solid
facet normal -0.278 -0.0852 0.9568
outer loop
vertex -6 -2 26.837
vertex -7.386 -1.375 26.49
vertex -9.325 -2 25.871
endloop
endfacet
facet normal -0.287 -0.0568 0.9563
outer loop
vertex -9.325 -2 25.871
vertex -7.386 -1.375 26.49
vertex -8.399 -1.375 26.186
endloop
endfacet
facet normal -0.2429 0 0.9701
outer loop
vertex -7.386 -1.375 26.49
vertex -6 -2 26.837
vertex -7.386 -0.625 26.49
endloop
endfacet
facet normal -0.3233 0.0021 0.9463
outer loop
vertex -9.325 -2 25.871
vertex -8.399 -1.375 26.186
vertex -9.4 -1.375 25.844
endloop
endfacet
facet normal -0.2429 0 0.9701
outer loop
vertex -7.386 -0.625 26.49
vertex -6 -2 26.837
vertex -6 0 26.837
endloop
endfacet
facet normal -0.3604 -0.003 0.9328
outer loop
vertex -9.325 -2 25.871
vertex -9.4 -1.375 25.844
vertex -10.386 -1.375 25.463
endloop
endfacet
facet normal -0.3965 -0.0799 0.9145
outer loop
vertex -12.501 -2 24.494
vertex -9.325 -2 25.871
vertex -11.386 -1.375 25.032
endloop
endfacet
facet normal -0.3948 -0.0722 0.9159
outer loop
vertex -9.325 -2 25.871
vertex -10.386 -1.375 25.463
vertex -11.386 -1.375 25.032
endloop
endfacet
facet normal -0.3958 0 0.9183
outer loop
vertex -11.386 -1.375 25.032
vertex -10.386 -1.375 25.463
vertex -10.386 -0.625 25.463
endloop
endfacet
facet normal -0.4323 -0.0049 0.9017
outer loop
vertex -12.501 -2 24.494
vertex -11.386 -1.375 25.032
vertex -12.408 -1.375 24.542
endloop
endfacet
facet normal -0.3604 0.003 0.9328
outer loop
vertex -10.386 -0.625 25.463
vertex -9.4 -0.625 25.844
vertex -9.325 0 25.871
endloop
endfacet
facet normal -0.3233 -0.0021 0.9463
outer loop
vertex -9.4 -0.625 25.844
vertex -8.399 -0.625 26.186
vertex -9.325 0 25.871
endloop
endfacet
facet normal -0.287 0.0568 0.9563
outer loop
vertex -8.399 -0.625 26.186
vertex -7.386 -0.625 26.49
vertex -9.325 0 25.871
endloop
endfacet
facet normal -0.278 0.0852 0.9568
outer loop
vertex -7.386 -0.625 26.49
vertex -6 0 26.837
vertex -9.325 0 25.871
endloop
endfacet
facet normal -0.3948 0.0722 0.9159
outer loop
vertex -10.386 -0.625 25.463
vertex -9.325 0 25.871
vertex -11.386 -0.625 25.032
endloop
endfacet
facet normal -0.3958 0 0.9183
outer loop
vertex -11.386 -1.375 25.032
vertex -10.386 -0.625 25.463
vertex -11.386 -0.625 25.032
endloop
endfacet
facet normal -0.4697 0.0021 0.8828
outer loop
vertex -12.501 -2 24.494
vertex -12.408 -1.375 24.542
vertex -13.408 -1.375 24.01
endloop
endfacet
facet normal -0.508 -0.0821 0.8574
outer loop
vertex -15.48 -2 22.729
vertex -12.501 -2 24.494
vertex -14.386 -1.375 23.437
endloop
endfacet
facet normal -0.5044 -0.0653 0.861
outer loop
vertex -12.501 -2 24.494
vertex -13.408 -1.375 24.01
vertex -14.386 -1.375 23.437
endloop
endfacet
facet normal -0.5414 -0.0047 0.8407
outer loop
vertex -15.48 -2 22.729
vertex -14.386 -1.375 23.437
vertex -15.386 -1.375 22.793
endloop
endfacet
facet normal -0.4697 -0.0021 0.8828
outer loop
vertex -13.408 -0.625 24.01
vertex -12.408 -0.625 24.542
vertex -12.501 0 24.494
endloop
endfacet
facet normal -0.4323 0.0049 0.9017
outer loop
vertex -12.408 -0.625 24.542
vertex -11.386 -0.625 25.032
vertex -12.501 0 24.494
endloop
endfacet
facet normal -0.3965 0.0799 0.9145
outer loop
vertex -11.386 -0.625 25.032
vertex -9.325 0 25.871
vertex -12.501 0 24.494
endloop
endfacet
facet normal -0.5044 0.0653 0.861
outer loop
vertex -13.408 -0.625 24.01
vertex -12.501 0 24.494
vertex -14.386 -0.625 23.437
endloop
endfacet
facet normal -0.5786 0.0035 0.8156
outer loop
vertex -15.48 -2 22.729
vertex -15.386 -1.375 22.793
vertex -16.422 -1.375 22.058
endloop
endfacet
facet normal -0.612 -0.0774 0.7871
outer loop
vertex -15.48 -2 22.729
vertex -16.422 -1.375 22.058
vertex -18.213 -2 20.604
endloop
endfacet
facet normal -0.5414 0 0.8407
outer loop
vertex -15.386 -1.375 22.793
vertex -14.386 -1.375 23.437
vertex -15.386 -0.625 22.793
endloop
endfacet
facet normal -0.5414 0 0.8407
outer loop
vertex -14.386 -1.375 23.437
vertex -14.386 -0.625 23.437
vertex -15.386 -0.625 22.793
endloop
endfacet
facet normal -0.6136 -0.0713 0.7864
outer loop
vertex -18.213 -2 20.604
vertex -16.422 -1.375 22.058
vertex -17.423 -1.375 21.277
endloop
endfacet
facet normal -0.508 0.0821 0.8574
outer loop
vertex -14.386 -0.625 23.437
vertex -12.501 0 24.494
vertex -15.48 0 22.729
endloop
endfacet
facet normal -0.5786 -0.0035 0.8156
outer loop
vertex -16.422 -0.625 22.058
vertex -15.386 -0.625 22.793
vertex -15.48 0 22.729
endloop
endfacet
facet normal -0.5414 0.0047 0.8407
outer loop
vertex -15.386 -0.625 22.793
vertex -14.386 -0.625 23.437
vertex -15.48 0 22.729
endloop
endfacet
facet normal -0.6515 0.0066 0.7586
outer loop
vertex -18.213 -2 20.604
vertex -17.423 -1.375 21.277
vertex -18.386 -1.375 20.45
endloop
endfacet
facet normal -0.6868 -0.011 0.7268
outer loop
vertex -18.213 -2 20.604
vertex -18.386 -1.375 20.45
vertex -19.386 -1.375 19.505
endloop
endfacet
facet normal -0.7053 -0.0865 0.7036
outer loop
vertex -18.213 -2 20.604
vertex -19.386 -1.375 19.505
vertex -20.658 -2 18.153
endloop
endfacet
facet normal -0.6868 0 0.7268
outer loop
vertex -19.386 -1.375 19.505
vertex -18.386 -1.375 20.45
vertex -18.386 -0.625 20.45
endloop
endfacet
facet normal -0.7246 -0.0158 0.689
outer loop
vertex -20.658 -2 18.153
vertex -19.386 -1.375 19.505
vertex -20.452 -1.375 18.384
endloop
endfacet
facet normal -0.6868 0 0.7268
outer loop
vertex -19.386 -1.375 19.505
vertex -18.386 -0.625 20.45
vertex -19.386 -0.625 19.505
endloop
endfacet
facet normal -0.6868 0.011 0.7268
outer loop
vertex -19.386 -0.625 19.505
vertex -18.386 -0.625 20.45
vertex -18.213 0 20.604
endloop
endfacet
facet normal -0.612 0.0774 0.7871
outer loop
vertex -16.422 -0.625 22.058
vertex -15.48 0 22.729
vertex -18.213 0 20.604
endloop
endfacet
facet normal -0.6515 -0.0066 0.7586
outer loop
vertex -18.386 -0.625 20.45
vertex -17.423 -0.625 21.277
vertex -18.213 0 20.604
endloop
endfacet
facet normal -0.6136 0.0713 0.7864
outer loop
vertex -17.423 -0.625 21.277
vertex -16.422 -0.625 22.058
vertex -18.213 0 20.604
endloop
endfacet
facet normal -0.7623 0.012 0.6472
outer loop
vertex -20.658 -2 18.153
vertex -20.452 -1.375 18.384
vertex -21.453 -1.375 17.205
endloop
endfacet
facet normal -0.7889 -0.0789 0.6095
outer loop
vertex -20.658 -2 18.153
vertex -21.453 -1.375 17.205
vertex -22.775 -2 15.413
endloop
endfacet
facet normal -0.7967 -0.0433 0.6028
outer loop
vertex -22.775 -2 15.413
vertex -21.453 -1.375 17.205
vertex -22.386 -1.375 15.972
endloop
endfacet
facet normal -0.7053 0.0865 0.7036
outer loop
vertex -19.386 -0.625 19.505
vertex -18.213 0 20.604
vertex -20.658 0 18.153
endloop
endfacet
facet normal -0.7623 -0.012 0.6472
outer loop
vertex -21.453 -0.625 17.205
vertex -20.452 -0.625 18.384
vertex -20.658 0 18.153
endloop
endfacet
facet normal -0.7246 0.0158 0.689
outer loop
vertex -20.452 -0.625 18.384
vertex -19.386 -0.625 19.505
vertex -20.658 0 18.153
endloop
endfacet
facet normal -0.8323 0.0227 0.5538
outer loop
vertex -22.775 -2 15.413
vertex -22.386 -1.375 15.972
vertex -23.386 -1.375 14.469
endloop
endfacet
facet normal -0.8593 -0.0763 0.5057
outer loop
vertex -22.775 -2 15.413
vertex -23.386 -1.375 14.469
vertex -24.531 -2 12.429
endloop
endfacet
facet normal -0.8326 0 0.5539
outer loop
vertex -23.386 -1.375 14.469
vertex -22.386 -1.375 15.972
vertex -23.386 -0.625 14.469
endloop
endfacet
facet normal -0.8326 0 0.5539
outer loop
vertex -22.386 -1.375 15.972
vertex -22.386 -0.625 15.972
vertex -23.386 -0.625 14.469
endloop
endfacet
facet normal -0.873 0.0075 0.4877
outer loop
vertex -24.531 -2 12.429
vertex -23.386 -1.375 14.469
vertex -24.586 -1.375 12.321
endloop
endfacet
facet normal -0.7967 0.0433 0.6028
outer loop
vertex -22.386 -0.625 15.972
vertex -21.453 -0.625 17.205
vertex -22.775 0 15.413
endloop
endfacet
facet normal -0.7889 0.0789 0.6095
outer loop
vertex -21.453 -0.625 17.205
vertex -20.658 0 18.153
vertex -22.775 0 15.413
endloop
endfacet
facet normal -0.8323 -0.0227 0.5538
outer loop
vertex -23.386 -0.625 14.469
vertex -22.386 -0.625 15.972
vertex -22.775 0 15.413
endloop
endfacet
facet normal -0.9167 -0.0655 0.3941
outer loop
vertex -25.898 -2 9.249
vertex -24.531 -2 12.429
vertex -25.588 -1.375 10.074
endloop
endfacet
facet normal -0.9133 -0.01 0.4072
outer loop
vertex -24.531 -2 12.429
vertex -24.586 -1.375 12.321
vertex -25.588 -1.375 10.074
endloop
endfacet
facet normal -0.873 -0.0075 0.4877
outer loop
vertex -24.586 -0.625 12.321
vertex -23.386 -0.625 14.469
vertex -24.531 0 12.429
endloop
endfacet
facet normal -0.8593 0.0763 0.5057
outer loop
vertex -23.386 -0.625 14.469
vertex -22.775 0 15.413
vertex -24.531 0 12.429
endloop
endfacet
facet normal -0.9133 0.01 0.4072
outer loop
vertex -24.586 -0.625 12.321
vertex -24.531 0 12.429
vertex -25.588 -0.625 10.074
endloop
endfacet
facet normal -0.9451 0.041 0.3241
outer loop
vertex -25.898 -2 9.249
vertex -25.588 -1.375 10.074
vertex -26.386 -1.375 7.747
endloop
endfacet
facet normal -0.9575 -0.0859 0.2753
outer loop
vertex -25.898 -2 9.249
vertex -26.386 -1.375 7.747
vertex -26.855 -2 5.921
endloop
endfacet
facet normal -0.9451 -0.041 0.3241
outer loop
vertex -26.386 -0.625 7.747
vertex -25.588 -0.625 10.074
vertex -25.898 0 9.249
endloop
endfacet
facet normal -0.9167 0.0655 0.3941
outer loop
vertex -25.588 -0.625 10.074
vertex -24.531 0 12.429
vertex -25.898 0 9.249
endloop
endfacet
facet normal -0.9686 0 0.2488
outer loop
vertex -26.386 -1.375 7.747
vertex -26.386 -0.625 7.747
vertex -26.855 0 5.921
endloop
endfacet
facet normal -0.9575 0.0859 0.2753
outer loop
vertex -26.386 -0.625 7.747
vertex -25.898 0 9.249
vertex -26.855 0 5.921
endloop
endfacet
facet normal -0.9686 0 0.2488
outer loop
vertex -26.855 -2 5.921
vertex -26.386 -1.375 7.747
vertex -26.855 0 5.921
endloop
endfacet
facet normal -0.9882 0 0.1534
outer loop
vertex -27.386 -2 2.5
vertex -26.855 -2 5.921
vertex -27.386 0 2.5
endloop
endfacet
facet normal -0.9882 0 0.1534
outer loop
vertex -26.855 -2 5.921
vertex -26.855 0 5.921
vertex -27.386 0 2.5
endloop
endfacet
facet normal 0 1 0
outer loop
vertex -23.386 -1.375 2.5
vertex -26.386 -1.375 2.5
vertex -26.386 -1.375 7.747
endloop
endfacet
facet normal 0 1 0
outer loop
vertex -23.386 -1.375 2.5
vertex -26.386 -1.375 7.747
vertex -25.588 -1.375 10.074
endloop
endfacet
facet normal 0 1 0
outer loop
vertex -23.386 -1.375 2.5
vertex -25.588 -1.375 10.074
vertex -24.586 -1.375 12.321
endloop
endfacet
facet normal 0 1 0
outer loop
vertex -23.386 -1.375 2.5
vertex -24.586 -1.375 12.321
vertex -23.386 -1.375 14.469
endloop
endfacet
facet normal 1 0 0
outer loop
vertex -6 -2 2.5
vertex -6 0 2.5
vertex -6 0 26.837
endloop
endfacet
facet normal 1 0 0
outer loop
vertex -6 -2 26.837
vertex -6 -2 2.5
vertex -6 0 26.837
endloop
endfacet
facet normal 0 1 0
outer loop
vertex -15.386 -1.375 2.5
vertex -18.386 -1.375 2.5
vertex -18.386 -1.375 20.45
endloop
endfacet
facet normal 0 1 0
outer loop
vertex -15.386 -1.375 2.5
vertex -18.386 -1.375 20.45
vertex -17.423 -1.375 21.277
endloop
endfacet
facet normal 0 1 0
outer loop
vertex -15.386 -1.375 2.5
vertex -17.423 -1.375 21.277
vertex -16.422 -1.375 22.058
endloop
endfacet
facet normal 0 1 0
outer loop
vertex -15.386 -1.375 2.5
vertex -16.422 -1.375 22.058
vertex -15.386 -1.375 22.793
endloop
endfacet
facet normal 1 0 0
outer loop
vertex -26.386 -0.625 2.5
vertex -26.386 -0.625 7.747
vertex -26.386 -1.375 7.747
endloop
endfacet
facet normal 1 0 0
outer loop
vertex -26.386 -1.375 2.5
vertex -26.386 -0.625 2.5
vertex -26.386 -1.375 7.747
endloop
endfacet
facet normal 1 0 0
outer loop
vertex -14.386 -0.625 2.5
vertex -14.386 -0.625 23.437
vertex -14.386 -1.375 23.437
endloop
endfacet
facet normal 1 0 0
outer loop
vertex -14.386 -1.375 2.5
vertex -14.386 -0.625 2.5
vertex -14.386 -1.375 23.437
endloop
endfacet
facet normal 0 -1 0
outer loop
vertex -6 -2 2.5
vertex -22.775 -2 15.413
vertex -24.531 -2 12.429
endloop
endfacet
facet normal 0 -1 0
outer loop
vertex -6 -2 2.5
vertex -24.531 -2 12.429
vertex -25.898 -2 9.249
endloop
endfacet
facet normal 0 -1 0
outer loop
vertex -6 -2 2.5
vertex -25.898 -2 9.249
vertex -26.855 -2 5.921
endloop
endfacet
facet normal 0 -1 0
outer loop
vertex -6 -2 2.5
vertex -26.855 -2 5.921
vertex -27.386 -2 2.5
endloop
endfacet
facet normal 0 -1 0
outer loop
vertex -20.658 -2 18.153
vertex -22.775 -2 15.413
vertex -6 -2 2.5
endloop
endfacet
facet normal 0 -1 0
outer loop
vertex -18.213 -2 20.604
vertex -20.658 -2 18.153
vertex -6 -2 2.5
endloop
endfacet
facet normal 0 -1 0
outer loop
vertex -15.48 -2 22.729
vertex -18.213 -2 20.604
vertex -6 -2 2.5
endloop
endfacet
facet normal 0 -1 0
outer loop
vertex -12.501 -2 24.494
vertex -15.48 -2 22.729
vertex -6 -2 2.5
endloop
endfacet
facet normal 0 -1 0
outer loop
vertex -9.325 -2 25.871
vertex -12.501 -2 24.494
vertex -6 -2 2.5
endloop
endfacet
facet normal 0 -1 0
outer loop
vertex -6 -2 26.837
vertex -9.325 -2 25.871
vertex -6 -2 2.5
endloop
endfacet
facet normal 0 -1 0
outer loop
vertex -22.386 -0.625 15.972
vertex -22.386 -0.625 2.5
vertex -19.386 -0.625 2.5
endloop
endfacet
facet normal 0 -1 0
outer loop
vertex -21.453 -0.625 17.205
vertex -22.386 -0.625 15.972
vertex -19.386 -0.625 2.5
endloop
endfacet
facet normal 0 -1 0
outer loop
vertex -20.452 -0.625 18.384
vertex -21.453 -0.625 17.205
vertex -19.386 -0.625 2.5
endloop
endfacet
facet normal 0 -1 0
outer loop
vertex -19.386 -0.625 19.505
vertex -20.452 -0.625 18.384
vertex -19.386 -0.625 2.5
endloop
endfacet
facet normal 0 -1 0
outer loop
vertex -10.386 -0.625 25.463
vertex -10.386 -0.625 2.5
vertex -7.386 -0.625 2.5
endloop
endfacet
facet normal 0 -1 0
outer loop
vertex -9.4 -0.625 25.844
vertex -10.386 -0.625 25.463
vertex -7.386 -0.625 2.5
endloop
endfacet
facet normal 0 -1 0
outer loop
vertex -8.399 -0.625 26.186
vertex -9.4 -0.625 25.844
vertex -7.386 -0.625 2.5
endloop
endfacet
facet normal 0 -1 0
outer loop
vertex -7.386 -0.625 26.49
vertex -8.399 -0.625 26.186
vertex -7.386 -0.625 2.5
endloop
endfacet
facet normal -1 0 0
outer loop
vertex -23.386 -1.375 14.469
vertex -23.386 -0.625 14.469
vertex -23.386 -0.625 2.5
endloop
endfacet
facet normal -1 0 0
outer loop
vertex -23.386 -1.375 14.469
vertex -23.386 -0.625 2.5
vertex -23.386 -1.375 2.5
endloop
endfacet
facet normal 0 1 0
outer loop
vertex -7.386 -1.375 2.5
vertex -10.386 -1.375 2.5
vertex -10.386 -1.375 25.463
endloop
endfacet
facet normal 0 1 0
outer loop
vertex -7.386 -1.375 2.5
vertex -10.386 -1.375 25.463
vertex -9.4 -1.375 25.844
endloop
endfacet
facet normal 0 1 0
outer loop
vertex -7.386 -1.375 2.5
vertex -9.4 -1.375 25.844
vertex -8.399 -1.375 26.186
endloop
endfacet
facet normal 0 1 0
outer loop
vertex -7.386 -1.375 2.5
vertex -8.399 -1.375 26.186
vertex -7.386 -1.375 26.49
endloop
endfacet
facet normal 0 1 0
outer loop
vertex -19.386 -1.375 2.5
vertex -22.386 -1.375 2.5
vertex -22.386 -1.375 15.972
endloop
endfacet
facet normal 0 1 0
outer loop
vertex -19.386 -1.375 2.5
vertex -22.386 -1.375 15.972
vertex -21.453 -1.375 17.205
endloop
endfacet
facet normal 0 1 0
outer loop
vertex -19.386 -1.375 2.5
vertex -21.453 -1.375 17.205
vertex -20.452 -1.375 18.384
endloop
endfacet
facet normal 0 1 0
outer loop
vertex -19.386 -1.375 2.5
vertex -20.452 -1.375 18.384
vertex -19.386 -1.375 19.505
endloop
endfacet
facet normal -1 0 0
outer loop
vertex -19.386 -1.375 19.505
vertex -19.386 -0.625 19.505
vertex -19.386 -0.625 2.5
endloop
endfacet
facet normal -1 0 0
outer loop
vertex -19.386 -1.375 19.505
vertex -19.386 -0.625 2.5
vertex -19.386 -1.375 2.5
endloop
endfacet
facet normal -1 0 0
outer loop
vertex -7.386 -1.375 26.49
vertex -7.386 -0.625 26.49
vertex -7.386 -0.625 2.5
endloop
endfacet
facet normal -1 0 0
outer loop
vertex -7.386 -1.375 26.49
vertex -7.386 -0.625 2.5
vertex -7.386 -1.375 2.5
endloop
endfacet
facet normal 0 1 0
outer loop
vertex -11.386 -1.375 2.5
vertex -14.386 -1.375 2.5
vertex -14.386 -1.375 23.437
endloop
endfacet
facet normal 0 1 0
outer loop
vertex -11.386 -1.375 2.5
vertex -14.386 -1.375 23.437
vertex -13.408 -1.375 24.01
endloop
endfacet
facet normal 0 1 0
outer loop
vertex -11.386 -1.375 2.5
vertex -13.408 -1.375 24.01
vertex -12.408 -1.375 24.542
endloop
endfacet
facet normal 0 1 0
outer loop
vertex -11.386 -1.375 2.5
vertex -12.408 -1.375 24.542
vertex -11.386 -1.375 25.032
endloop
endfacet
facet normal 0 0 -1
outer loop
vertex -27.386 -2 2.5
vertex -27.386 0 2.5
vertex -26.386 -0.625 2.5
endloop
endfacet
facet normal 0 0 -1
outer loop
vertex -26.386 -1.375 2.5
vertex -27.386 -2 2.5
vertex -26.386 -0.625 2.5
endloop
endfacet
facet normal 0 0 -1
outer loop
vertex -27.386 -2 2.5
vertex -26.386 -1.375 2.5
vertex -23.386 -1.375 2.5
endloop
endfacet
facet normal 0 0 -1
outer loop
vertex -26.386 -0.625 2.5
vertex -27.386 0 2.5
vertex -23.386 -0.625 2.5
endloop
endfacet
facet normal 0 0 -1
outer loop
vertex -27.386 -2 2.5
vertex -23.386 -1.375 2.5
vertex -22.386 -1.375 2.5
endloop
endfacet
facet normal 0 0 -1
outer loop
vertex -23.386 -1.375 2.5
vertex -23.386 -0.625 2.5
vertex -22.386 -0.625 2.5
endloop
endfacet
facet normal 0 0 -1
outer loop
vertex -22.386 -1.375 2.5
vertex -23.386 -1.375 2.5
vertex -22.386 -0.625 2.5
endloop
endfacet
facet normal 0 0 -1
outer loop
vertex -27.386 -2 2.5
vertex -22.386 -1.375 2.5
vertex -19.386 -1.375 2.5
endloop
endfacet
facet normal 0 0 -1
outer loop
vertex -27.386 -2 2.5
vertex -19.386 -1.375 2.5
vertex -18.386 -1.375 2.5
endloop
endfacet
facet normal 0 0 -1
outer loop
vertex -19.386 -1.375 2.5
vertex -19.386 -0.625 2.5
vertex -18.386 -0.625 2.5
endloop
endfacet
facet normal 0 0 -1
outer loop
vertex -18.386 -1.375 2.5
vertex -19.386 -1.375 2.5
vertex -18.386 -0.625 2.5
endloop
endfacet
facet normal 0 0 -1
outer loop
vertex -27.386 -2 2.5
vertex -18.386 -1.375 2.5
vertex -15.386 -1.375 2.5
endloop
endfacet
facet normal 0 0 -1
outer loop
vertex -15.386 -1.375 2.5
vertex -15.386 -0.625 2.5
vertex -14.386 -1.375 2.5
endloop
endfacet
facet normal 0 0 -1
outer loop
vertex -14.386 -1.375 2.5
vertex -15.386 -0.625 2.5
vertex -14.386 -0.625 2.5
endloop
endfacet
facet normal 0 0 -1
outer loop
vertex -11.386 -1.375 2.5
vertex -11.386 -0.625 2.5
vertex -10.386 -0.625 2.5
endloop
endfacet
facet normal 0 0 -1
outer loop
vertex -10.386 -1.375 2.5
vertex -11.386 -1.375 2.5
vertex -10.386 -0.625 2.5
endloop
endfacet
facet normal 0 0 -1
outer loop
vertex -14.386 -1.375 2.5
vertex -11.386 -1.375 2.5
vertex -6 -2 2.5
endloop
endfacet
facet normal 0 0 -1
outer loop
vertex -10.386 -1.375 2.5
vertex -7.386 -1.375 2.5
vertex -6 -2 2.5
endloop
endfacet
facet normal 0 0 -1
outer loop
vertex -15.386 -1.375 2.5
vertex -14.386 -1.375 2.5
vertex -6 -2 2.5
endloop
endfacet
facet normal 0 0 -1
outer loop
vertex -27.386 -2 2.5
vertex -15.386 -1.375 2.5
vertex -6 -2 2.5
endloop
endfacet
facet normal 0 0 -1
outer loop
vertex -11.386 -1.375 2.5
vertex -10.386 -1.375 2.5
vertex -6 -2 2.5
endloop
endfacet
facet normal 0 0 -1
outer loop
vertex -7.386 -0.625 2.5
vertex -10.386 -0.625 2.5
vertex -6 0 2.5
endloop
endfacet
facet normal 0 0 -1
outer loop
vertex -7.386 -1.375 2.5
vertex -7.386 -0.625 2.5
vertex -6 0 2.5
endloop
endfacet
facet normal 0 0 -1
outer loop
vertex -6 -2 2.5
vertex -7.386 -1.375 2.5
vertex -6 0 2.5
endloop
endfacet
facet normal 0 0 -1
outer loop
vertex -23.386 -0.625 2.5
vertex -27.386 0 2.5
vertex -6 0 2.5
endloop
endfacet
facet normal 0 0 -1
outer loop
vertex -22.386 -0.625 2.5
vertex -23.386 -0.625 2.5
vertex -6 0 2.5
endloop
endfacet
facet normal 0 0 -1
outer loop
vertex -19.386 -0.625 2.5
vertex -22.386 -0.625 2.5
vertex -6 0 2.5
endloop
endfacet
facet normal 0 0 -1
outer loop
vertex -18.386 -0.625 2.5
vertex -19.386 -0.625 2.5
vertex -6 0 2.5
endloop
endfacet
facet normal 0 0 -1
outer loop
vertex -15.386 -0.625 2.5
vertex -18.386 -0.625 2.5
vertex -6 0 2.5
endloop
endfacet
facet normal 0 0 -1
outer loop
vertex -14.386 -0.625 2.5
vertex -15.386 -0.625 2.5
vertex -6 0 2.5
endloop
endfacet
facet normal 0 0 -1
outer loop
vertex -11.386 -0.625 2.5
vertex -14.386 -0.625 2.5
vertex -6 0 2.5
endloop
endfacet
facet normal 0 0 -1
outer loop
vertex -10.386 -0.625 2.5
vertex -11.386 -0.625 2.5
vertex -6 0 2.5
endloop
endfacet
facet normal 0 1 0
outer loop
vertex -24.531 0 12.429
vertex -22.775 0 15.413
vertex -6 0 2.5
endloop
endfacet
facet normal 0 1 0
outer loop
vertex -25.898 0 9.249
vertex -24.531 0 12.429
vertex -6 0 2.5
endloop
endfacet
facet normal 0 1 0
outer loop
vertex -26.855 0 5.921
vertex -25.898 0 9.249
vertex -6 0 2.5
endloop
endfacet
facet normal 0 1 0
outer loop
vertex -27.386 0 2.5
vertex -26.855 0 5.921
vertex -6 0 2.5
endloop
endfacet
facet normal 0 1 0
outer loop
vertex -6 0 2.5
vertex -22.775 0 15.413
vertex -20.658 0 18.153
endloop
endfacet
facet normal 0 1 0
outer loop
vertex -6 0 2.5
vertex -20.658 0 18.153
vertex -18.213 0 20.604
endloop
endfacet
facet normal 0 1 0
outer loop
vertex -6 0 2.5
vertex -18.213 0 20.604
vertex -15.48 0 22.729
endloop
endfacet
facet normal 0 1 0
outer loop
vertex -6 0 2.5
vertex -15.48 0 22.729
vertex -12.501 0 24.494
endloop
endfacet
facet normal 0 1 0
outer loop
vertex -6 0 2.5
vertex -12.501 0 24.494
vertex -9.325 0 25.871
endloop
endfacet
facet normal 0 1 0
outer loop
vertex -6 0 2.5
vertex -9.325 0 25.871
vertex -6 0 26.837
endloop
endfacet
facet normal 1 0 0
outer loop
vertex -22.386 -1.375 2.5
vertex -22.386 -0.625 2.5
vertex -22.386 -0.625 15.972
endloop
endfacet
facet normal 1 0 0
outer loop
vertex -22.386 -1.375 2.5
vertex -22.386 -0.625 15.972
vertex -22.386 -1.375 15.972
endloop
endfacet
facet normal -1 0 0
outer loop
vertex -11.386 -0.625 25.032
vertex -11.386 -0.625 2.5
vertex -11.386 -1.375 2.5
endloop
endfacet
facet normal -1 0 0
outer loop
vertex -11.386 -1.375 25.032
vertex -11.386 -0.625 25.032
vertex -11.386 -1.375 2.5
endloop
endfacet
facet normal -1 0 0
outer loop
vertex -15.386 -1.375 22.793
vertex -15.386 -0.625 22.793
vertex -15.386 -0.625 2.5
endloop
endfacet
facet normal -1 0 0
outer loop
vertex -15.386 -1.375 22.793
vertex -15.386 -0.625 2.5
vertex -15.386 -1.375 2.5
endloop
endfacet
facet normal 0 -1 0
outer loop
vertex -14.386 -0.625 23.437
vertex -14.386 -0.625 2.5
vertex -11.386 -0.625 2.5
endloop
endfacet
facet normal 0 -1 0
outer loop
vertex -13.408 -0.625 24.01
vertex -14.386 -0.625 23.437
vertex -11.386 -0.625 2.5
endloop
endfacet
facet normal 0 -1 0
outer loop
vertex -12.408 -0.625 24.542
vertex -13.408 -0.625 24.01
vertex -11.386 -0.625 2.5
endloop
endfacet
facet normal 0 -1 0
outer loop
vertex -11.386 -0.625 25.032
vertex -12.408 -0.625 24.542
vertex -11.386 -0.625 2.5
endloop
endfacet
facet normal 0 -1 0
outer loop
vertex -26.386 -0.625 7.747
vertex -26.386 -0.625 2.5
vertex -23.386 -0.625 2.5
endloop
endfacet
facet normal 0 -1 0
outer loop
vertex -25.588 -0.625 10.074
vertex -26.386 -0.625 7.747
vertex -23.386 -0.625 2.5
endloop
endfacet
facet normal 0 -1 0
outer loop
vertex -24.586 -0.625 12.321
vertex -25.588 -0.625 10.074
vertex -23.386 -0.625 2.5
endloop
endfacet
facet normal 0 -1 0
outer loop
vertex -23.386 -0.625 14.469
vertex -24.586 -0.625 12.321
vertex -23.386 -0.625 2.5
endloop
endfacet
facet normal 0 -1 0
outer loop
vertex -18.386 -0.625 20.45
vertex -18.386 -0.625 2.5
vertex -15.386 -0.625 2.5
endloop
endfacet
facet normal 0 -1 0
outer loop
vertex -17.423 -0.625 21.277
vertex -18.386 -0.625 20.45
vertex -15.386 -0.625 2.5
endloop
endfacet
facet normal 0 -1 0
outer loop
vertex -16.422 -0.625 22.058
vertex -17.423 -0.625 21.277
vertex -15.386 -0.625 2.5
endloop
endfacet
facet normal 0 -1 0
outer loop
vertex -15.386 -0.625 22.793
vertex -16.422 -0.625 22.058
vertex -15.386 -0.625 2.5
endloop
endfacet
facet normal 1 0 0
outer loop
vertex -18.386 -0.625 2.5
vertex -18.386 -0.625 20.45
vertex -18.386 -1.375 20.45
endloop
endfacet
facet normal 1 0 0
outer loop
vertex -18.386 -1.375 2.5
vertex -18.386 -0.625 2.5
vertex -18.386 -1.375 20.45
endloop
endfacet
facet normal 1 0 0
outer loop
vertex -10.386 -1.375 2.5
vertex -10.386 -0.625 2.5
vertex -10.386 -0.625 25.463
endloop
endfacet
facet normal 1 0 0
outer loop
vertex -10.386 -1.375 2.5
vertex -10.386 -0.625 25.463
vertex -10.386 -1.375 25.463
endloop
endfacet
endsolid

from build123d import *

# Parameters (mm, degrees)
F1_DEPTH = 2
F2_W     = 3
F2_H     = 0.75
F3_DEPTH = 25


with BuildPart() as f1:
    # F0 (on Front) → F1 (new body)
    with BuildSketch(Plane.XZ):
        with BuildLine():
            Line((-6, 2.5), (-6, 26.837474))
            ThreePointArc((-6, 26.837474), (-20.657603, 18.152506), (-27.386128, 2.5))
            Line((-27.386128, 2.5), (-6, 2.5))
        make_face()
    extrude(amount=F1_DEPTH)

    # F2 (on face) → F3 (cut)
    with BuildSketch(Plane(origin=(0, 0, 2.5), x_dir=(1, 0, 0), z_dir=(0, 0, -1))):
        with Locations((-24.886128, 1)):
            Rectangle(F2_W, F2_H)
        with Locations((-20.886128, 1)):
            Rectangle(F2_W, F2_H)
        with Locations((-16.886128, 1)):
            Rectangle(F2_W, F2_H)
        with Locations((-12.886128, 1)):
            Rectangle(F2_W, F2_H)
        with Locations((-8.886128, 1)):
            Rectangle(F2_W, F2_H)
    extrude(amount=-F3_DEPTH, mode=Mode.SUBTRACT)


solid = f1.part
